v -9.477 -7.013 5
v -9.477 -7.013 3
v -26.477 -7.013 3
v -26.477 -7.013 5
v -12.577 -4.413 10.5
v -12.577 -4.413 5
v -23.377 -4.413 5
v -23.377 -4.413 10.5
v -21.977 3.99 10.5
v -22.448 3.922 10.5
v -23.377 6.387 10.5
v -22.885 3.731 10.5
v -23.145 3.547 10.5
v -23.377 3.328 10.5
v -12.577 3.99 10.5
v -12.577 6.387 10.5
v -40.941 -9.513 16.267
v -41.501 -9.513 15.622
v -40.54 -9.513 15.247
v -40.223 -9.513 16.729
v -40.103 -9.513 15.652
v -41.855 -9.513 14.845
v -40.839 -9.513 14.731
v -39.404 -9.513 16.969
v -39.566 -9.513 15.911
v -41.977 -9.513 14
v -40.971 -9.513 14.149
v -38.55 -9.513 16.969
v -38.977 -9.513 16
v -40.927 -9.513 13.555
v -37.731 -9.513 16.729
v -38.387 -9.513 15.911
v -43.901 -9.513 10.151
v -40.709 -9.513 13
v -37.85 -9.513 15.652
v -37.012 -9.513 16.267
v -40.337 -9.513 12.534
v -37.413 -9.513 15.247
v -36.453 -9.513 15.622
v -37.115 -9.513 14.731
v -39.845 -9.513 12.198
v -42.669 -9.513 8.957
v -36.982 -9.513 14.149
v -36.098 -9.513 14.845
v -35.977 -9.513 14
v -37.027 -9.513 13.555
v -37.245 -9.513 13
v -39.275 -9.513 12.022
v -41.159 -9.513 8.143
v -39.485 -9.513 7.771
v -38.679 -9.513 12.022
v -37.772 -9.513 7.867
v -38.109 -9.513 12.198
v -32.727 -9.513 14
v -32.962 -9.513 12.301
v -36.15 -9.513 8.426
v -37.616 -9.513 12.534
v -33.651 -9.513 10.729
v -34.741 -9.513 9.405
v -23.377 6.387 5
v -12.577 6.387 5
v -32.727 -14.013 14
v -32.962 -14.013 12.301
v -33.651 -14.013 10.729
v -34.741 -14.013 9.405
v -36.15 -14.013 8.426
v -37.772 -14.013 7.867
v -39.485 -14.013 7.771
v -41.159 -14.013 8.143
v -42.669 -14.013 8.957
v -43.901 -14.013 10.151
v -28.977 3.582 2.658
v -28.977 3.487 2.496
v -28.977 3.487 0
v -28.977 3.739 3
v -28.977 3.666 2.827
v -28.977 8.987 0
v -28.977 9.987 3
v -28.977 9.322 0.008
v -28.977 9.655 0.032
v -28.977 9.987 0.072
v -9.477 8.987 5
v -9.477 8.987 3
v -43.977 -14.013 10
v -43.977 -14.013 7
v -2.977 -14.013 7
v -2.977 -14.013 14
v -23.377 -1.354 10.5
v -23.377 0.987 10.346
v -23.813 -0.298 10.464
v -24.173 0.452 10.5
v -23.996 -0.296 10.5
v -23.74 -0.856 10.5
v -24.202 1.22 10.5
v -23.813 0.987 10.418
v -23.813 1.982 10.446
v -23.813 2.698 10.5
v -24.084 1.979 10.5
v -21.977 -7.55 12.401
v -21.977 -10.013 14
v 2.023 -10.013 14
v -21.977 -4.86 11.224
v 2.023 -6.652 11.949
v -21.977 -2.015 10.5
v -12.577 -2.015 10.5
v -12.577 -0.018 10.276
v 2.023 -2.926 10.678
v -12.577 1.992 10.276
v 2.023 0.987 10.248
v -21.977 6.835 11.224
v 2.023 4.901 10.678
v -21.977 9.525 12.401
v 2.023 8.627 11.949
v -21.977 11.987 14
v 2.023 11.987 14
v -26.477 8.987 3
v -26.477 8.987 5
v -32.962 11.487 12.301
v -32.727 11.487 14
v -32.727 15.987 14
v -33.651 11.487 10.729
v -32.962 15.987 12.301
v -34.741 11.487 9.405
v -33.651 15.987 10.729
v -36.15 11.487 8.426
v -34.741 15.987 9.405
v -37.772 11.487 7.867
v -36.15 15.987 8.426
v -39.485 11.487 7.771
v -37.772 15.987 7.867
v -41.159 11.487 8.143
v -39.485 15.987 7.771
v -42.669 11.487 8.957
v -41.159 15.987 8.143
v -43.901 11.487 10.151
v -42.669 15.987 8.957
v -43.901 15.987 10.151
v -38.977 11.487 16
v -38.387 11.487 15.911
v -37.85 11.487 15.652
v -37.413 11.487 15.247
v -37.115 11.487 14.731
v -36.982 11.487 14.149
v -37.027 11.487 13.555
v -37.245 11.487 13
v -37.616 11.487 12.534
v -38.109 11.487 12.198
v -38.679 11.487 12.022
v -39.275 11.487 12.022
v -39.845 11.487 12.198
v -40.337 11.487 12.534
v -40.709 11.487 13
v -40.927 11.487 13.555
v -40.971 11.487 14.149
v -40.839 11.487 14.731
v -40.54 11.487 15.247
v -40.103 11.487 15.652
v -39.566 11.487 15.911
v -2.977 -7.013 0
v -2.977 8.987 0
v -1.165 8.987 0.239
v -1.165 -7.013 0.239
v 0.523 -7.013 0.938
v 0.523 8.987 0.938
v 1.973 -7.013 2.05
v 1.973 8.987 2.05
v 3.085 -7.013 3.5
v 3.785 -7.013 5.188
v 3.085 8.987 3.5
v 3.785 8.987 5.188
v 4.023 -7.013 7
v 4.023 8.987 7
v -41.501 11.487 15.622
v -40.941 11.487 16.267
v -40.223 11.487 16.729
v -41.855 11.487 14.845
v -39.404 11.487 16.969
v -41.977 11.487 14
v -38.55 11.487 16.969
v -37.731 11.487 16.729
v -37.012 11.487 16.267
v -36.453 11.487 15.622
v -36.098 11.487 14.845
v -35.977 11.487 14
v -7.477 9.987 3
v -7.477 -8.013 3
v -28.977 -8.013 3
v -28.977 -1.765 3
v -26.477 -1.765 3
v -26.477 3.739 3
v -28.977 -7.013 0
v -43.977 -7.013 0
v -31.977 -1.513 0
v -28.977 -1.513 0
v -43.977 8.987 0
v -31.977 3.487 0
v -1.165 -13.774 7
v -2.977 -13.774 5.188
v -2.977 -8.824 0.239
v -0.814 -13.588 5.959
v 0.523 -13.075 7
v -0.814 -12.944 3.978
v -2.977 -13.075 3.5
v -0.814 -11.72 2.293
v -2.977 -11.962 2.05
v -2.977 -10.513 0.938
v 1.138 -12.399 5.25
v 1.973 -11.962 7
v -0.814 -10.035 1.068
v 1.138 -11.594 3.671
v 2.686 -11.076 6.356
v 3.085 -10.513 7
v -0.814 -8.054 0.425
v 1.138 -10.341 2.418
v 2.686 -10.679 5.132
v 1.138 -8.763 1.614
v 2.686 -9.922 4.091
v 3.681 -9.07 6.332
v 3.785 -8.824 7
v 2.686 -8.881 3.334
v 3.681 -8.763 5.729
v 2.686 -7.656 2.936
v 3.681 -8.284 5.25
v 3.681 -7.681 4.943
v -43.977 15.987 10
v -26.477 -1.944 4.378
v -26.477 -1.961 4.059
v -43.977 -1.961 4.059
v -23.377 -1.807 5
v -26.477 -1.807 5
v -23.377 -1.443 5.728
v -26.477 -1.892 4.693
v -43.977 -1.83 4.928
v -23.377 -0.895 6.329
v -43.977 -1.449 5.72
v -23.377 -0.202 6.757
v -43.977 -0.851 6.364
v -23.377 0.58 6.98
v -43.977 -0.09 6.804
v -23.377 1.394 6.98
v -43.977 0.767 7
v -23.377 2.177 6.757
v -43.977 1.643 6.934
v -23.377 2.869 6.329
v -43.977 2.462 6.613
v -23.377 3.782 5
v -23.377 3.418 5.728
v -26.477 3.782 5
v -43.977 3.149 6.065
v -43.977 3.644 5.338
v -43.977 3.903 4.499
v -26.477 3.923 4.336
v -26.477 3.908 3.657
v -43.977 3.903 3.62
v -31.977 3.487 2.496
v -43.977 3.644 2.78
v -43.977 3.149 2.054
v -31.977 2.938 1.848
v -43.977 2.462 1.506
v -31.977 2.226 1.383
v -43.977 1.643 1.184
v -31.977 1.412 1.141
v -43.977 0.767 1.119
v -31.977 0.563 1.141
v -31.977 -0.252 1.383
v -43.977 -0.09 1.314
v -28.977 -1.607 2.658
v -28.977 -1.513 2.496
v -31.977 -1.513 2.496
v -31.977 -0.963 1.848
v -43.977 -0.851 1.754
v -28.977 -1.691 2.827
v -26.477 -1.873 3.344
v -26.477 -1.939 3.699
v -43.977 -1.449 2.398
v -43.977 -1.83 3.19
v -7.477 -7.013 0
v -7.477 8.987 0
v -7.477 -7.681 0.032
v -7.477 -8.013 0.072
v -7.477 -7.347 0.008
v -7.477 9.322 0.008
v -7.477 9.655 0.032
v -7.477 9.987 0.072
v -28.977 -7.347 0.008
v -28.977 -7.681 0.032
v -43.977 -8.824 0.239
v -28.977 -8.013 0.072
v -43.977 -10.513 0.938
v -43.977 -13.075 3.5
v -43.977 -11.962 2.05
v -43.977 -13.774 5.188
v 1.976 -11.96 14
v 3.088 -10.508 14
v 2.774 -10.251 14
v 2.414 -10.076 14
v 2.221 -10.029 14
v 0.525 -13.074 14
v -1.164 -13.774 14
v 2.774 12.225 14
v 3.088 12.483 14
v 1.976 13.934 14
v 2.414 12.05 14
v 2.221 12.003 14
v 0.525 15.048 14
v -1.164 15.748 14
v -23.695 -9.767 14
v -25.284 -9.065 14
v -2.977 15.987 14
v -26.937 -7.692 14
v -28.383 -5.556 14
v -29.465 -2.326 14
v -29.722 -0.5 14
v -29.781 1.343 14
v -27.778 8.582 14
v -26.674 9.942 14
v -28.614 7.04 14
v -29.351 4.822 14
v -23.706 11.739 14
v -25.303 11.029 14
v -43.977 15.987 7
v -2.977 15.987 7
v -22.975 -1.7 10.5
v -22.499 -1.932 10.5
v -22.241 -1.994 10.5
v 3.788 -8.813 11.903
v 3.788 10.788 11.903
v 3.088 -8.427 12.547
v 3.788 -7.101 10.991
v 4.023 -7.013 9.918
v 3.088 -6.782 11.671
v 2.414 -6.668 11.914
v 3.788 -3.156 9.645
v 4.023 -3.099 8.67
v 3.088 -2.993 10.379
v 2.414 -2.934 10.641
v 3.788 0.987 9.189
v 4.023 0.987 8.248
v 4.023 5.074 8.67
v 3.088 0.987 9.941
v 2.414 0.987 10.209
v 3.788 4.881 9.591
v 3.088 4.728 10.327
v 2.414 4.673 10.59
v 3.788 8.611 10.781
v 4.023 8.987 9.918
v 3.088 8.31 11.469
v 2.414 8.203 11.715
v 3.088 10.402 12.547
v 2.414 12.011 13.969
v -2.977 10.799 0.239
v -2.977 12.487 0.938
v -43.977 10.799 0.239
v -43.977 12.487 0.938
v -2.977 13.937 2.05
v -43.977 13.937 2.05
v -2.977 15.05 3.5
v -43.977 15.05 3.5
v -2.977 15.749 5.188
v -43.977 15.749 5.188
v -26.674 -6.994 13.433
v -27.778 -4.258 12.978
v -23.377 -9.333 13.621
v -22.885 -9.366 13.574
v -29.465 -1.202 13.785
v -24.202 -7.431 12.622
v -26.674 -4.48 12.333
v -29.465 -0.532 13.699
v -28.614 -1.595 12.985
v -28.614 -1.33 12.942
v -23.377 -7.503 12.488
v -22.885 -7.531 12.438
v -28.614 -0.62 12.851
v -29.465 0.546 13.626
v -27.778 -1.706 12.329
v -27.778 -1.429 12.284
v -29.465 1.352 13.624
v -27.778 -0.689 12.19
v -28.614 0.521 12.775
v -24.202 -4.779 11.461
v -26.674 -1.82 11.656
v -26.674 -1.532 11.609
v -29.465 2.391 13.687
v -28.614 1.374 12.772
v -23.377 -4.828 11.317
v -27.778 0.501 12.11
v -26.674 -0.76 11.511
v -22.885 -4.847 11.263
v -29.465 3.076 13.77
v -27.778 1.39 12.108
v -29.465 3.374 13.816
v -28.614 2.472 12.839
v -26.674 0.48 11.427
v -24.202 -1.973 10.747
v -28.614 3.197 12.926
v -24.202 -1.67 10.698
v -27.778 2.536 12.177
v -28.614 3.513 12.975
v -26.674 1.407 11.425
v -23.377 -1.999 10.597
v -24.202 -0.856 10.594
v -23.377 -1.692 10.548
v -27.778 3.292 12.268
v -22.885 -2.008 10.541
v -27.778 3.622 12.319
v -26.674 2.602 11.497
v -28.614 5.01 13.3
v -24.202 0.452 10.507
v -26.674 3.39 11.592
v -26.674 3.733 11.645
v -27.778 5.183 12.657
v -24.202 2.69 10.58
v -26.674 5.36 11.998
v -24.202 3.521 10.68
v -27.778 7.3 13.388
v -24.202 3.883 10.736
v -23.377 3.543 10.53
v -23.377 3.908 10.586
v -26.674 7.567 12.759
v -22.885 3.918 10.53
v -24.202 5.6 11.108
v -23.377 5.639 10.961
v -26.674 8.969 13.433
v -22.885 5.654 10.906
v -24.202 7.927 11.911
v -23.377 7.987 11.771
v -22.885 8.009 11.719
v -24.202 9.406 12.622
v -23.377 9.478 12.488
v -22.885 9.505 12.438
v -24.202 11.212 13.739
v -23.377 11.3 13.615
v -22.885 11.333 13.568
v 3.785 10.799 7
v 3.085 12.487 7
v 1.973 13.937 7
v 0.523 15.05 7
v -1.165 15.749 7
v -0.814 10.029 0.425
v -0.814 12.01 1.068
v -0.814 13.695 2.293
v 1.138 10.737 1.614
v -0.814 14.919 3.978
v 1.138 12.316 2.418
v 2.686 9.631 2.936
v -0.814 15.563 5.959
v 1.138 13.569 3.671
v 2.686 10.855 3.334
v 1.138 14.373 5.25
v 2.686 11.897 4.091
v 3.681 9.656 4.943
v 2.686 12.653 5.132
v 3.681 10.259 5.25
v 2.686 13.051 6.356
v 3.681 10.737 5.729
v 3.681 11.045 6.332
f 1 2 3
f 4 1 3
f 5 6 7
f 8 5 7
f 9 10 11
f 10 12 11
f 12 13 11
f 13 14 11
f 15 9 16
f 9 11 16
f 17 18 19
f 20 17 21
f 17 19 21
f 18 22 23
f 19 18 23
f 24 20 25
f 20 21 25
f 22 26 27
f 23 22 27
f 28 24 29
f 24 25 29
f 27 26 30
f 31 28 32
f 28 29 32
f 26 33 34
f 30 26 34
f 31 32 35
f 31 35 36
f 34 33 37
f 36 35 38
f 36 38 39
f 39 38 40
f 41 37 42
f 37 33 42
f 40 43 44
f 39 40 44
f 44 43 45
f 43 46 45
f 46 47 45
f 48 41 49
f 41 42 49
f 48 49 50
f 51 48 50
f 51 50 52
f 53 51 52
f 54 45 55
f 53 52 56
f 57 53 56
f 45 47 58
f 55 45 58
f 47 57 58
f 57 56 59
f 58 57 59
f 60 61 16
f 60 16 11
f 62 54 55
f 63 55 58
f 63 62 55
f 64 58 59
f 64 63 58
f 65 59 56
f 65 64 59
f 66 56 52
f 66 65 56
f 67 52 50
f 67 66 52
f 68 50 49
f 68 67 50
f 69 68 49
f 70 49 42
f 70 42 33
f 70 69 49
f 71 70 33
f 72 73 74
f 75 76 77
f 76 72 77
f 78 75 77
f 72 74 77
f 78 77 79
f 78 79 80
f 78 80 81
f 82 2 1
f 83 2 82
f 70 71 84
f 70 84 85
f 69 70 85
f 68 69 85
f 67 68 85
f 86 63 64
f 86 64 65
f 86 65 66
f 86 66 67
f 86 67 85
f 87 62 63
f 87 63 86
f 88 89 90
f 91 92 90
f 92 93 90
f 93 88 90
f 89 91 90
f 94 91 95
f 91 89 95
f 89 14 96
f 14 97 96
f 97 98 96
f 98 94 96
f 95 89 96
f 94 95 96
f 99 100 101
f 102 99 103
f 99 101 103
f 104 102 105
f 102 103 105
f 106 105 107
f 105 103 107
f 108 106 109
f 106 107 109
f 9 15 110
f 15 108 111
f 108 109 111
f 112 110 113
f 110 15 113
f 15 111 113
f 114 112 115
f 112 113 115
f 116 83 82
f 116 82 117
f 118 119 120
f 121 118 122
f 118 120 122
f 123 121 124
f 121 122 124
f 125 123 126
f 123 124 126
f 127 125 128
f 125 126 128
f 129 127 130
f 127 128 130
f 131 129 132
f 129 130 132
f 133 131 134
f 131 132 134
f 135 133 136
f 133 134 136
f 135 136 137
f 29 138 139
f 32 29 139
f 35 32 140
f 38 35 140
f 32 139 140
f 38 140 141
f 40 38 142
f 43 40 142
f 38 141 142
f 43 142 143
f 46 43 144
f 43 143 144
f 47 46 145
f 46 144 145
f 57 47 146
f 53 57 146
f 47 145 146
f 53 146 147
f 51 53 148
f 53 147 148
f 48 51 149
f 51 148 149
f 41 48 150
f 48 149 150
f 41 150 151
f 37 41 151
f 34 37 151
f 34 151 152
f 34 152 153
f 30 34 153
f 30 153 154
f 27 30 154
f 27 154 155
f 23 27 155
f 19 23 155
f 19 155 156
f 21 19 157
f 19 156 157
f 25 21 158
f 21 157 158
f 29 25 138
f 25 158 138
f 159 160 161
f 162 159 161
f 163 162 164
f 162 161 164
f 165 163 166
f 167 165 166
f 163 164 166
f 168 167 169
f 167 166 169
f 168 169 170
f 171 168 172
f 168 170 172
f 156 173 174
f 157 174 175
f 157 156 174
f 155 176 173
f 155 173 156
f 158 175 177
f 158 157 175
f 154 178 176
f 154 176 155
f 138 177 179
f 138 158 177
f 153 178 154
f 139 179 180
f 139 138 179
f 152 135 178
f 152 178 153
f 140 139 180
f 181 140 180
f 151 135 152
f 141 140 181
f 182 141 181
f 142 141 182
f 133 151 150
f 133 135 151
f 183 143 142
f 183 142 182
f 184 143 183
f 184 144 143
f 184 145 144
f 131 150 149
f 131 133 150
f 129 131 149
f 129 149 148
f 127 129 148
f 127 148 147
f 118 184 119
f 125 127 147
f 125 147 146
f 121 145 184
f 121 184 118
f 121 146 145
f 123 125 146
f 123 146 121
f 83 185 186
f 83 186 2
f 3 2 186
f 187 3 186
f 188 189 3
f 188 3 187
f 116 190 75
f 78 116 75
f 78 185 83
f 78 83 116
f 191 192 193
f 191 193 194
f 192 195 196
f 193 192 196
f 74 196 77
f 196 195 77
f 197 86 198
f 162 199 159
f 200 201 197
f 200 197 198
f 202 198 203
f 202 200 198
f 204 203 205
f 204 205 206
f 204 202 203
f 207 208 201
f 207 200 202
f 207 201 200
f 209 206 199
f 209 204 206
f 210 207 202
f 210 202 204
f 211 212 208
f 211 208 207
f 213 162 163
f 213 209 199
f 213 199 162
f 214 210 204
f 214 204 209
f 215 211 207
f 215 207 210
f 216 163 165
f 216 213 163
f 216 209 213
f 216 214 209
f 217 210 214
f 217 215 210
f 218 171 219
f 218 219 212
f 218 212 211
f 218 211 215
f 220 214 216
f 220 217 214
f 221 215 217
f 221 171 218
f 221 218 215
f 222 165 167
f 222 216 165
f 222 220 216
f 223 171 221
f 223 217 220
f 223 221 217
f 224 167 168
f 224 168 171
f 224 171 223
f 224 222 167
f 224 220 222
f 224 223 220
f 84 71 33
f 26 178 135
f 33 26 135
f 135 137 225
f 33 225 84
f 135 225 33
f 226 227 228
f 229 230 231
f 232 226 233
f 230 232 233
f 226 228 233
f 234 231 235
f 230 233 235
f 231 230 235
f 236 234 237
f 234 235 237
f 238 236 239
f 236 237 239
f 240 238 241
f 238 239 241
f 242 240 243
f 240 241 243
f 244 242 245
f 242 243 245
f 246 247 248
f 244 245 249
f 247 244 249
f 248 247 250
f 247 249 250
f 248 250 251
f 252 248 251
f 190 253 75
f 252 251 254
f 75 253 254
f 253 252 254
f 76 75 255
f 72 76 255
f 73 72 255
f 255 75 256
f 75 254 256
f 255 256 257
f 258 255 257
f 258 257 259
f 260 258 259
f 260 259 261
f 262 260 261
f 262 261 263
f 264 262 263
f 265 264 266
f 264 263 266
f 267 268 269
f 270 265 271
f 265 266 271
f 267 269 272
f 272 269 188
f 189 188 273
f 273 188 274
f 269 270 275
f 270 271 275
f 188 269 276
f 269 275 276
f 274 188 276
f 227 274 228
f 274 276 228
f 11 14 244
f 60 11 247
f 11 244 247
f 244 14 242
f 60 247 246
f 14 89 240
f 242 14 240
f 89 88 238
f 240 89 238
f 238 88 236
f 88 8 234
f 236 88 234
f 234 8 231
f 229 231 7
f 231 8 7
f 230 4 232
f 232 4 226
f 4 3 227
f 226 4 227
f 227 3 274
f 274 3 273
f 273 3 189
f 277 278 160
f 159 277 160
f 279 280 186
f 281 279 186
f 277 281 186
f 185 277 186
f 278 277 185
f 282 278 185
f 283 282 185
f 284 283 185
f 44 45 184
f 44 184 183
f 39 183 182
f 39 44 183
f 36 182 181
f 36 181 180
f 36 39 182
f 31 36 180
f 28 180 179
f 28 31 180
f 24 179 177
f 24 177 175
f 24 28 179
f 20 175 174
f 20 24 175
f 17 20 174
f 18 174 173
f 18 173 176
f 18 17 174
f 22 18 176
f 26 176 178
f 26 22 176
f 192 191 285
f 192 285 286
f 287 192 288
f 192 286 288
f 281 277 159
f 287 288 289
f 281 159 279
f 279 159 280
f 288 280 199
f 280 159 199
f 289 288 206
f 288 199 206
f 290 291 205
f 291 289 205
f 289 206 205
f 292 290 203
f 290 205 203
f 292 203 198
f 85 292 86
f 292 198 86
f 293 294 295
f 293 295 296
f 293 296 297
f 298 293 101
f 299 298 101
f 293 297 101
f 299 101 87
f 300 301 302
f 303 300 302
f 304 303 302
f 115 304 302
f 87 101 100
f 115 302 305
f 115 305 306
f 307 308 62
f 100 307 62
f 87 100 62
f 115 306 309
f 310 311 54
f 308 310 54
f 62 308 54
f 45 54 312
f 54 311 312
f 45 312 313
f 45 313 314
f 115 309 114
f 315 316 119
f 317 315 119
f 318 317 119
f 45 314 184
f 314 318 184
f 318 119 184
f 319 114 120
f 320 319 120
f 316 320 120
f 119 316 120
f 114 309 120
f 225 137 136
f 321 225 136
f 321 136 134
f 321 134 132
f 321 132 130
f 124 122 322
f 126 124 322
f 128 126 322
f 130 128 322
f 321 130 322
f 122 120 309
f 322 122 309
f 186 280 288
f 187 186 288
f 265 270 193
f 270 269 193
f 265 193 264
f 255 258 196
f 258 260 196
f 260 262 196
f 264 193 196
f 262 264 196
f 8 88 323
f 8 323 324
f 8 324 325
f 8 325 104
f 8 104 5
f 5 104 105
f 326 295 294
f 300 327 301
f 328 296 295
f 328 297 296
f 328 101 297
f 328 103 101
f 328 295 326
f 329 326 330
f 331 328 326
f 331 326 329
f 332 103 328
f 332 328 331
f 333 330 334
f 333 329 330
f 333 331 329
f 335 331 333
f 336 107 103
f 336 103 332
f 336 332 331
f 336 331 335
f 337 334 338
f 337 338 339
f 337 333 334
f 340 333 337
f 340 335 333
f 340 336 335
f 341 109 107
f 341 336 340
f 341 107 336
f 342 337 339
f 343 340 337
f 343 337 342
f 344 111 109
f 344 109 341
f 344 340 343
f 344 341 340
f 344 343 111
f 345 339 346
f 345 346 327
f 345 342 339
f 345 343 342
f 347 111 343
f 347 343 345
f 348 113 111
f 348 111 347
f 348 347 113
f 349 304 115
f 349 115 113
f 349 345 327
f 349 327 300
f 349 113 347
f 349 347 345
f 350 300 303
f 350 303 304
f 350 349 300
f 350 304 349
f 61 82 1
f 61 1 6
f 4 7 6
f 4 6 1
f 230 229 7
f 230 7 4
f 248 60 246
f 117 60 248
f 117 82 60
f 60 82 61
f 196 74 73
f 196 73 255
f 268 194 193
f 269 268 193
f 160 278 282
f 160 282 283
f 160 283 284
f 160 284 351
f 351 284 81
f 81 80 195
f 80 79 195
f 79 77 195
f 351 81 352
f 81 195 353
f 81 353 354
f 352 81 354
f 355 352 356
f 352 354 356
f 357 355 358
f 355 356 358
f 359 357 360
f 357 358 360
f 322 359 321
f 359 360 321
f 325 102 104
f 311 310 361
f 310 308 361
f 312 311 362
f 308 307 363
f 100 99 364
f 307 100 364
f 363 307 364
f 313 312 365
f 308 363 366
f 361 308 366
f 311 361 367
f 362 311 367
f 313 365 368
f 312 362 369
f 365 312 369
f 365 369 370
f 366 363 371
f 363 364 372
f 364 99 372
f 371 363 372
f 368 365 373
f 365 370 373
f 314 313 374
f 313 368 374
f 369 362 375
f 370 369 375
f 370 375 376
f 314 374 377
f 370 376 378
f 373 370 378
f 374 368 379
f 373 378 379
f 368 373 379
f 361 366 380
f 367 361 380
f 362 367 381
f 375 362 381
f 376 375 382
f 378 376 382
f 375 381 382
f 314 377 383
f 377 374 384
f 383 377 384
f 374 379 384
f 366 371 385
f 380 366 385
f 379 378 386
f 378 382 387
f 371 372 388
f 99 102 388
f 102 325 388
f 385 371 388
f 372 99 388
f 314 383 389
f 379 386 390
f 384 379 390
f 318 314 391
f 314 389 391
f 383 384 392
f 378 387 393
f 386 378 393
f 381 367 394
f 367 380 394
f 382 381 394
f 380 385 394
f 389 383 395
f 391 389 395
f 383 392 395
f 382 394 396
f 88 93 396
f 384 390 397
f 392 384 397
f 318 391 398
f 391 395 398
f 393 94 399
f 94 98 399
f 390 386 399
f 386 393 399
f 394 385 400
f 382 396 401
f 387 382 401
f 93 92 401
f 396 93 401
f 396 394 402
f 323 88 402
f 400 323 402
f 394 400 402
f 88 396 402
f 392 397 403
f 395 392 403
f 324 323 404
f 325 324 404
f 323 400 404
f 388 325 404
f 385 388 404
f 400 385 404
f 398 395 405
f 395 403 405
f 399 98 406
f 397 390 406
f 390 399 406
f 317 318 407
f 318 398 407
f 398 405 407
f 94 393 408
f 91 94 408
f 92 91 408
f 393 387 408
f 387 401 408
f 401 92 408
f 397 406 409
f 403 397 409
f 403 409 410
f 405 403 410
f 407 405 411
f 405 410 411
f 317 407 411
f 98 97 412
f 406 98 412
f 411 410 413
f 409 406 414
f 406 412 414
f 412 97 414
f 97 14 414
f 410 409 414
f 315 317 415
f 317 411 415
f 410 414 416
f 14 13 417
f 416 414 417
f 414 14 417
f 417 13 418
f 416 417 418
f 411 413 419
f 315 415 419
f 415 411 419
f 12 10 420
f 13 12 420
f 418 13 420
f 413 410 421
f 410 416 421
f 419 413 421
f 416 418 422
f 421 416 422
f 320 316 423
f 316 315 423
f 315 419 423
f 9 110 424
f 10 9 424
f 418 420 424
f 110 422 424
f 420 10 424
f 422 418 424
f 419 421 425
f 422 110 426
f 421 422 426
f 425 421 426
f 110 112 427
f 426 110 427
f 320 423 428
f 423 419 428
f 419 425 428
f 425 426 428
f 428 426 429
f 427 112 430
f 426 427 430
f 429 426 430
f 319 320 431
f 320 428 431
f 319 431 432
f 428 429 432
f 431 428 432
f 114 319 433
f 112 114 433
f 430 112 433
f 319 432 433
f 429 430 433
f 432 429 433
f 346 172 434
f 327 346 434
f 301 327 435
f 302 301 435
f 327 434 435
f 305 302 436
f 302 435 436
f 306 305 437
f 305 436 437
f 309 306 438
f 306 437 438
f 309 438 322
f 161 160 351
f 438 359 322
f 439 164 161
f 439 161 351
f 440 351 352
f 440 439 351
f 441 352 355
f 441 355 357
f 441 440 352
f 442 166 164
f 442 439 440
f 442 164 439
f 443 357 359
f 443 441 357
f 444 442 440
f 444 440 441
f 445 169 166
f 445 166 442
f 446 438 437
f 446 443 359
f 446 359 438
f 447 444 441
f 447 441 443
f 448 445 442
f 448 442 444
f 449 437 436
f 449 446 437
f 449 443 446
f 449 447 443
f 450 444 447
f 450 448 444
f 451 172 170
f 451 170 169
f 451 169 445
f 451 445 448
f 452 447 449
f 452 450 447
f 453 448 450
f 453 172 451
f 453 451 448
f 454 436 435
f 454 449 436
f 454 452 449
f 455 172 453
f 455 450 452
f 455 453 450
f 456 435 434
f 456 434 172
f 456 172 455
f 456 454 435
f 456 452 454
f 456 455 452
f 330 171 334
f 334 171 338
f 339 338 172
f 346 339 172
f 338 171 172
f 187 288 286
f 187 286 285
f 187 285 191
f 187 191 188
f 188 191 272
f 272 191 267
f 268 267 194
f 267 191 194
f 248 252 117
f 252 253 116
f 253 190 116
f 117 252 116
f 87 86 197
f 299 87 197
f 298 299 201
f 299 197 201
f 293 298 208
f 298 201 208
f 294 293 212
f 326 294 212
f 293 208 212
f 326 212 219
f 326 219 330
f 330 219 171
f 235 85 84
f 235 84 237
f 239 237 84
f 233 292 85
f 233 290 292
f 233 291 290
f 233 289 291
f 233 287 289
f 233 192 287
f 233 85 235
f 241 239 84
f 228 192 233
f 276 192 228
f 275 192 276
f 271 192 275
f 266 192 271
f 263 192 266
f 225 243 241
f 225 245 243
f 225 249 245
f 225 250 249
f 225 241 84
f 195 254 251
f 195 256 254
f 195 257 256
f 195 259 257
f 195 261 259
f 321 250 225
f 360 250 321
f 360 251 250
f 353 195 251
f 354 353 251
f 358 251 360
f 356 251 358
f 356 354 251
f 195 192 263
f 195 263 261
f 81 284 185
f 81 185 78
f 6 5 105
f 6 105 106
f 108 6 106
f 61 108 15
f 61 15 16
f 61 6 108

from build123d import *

# Parameters (mm, degrees)
CROQUIS1_W                 = 48
CROQUIS1_H                 = 30
SALIENTE_EXTRUIR1_DEPTH    = 14
CORTAR_EXTRUIR1_DEPTH      = 36
REDONDEO1_R                = 2
REDONDEO2_R                = 7
CROQUIS3_W                 = 21.5
CROQUIS3_H                 = 18
CORTAR_EXTRUIR2_DEPTH      = 3
CORTAR_EXTRUIR3_REACH      = 50.842
CORTAR_EXTRUIR3_END_RADIUS = 18
CROQUIS5_R                 = 1
CROQUIS6_W                 = 10.8
CROQUIS6_H                 = 10.8
CORTAR_EXTRUIR4_DEPTH      = 7.5
CROQUIS7_W                 = 17
CROQUIS7_H                 = 16
CORTAR_EXTRUIR5_DEPTH      = 2
CROQUIS9_R                 = 3
SALIENTE_EXTRUIR2_DEPTH    = 30
CROQUIS10_R                = 6.25
CORTAR_EXTRUIR7_DEPTH      = 4.5
CROQUIS11_R                = 2
CORTAR_EXTRUIR8_DEPTH      = 21
CORTAR_EXTRUIR9_REACH      = 57.883
CROQUIS13_W                = 3
CROQUIS13_H                = 5
CORTAR_EXTRUIR10_DEPTH     = 3
REDONDEO3_R                = 10
CROQUIS14_R                = 2.948637221
CORTAR_EXTRUIR15_DEPTH     = 21


with BuildPart() as part:
    # Croquis1 → Saliente-Extruir1 (new body)
    with BuildSketch(Plane.XY):
        with Locations((-19.976765257, 0.987352556)):
            Rectangle(CROQUIS1_W, CROQUIS1_H)
    extrude(amount=SALIENTE_EXTRUIR1_DEPTH)

    # Croquis2 → Cortar-Extruir1 (cut)
    with BuildSketch(Plane(origin=(4.023234743, 0, 0), x_dir=(0, 0, -1), z_dir=(1, 0, 0))):
        with BuildLine():
            ThreePointArc((-14, -10.012647444), (-10.247806849, 0.987352556), (-14, 11.987352556))
            Line((-14, 11.987352556), (-14, -10.012647444))
        make_face()
    extrude(amount=-CORTAR_EXTRUIR1_DEPTH, mode=Mode.SUBTRACT)

    # Redondeo1
    redondeo1_edges = [part.edges().sort_by_distance(p)[0] for p in [
        (4.023234743, 0.987352556, 10.247806849),
    ]]
    fillet(redondeo1_edges, radius=REDONDEO1_R)

    # Redondeo2
    # the kernel refuses this fillet: 7 mm, written as the material it takes off along each edge
    with BuildSketch(Plane(origin=(-2.976765257, -7.012647444, 7), x_dir=(0, -1, 0), z_dir=(1, 0, 0))) as redondeo2_piece_1_section:
        Polygon((0, 0), (REDONDEO2_R * 1.02, 0), (REDONDEO2_R * 1.02, REDONDEO2_R * 1.02), (0, REDONDEO2_R * 1.02), align=None)
    redondeo2_piece_1 = extrude(amount=REDONDEO2_R * 1.02, mode=Mode.PRIVATE)
    redondeo2_piece_1 = redondeo2_piece_1 - Plane(origin=(-2.976765257, -7.012647444, 7), x_dir=(0, 0.7071067811865475, 0.7071067811865475), z_dir=(1, 0, 0)) * Sphere(REDONDEO2_R, mode=Mode.PRIVATE)
    add(redondeo2_piece_1, mode=Mode.SUBTRACT)
    with BuildSketch(Plane(origin=(-2.976765257, 8.987352556, 7), x_dir=(0, 0, -1), z_dir=(1, 0, 0))) as redondeo2_piece_2_section:
        Polygon((0, 0), (REDONDEO2_R * 1.02, 0), (REDONDEO2_R * 1.02, REDONDEO2_R * 1.02), (0, REDONDEO2_R * 1.02), align=None)
    redondeo2_piece_2 = extrude(amount=REDONDEO2_R * 1.02, mode=Mode.PRIVATE)
    redondeo2_piece_2 = redondeo2_piece_2 - Plane(origin=(-2.976765257, 8.987352556, 7), x_dir=(0, -0.7071067811865475, 0.7071067811865475), z_dir=(1, 0, 0)) * Sphere(REDONDEO2_R, mode=Mode.PRIVATE)
    add(redondeo2_piece_2, mode=Mode.SUBTRACT)
    with BuildSketch(Plane(origin=(-2.976765257, -14.012647444, 0), x_dir=(0, 0, 1), z_dir=(-1, 0, 0))) as redondeo2_piece_3:
        with BuildLine():
            CenterArc((REDONDEO2_R, REDONDEO2_R), REDONDEO2_R, 180, 90)
            Line((0, REDONDEO2_R), (-REDONDEO2_R * 0.02, REDONDEO2_R))
            Line((-REDONDEO2_R * 0.02, REDONDEO2_R), (-REDONDEO2_R * 0.02, -REDONDEO2_R * 0.02))
            Line((-REDONDEO2_R * 0.02, -REDONDEO2_R * 0.02), (REDONDEO2_R, -REDONDEO2_R * 0.02))
            Line((REDONDEO2_R, -REDONDEO2_R * 0.02), (REDONDEO2_R, 0))
        make_face()
    extrude(amount=58.5, mode=Mode.SUBTRACT)
    with BuildSketch(Plane(origin=(4.023234743, 8.987352556, 0), x_dir=(0, 0, 1), z_dir=(0, -1, 0))) as redondeo2_piece_4:
        with BuildLine():
            CenterArc((REDONDEO2_R, REDONDEO2_R), REDONDEO2_R, 180, 90)
            Line((0, REDONDEO2_R), (-REDONDEO2_R * 0.02, REDONDEO2_R))
            Line((-REDONDEO2_R * 0.02, REDONDEO2_R), (-REDONDEO2_R * 0.02, -REDONDEO2_R * 0.02))
            Line((-REDONDEO2_R * 0.02, -REDONDEO2_R * 0.02), (REDONDEO2_R, -REDONDEO2_R * 0.02))
            Line((REDONDEO2_R, -REDONDEO2_R * 0.02), (REDONDEO2_R, 0))
        make_face()
    extrude(amount=16, mode=Mode.SUBTRACT)
    with BuildSketch(Plane(origin=(-61.476765257, 15.987352556, 0), x_dir=(0, -1, 0), z_dir=(1, 0, 0))) as redondeo2_piece_5:
        with BuildLine():
            CenterArc((REDONDEO2_R, -REDONDEO2_R), REDONDEO2_R, 90, 90)
            Line((0, -REDONDEO2_R), (-REDONDEO2_R * 0.02, -REDONDEO2_R))
            Line((-REDONDEO2_R * 0.02, -REDONDEO2_R), (-REDONDEO2_R * 0.02, REDONDEO2_R * 0.02))
            Line((-REDONDEO2_R * 0.02, REDONDEO2_R * 0.02), (REDONDEO2_R, REDONDEO2_R * 0.02))
            Line((REDONDEO2_R, REDONDEO2_R * 0.02), (REDONDEO2_R, 0))
        make_face()
    extrude(amount=58.5, mode=Mode.SUBTRACT)
    with BuildSketch(Plane(origin=(4.023234743, 15.987352556, 7), x_dir=(0, -1, 0), z_dir=(0, 0, 1))) as redondeo2_piece_6:
        with BuildLine():
            CenterArc((REDONDEO2_R, -REDONDEO2_R), REDONDEO2_R, 90, 90)
            Line((0, -REDONDEO2_R), (-REDONDEO2_R * 0.02, -REDONDEO2_R))
            Line((-REDONDEO2_R * 0.02, -REDONDEO2_R), (-REDONDEO2_R * 0.02, REDONDEO2_R * 0.02))
            Line((-REDONDEO2_R * 0.02, REDONDEO2_R * 0.02), (REDONDEO2_R, REDONDEO2_R * 0.02))
            Line((REDONDEO2_R, REDONDEO2_R * 0.02), (REDONDEO2_R, 0))
        make_face()
    extrude(amount=24.5, mode=Mode.SUBTRACT)
    with BuildSketch(Plane(origin=(4.023234743, -14.012647444, 7), x_dir=(0, 1, 0), z_dir=(0, 0, 1))) as redondeo2_piece_7:
        with BuildLine():
            CenterArc((REDONDEO2_R, REDONDEO2_R), REDONDEO2_R, 180, 90)
            Line((0, REDONDEO2_R), (-REDONDEO2_R * 0.02, REDONDEO2_R))
            Line((-REDONDEO2_R * 0.02, REDONDEO2_R), (-REDONDEO2_R * 0.02, -REDONDEO2_R * 0.02))
            Line((-REDONDEO2_R * 0.02, -REDONDEO2_R * 0.02), (REDONDEO2_R, -REDONDEO2_R * 0.02))
            Line((REDONDEO2_R, -REDONDEO2_R * 0.02), (REDONDEO2_R, 0))
        make_face()
    extrude(amount=24.5, mode=Mode.SUBTRACT)

    # Croquis3 → Cortar-Extruir2 (cut)
    with BuildSketch(Plane(origin=(0, 0, 0), x_dir=(-1, 0, 0), z_dir=(0, 0, -1))):
        with Locations((18.226765257, 0.987352556)):
            Rectangle(CROQUIS3_W, CROQUIS3_H)
    extrude(amount=-CORTAR_EXTRUIR2_DEPTH, mode=Mode.SUBTRACT)

    # Cortar-Extruir3: up to this cylinder (the profile starts outside it)
    cortar_extruir3_end = Plane(origin=(-17.976765, 0.987352556, 28.247806849), z_dir=(1, 0, 0)) * Cylinder(CORTAR_EXTRUIR3_END_RADIUS, 138.684, mode=Mode.PRIVATE)
    # Croquis5 → Cortar-Extruir3 (cut, up to the surface)
    with BuildSketch(Plane(origin=(0, 0, 0), x_dir=(-1, 0, 0), z_dir=(0, 0, -1)), mode=Mode.PRIVATE) as cortar_extruir3_sk1:
        with Locations((17.976765257, 0.987352556)):
            Circle(CROQUIS5_R)
    cortar_extruir3_tool1 = extrude(cortar_extruir3_sk1.sketch, amount=-CORTAR_EXTRUIR3_REACH, mode=Mode.PRIVATE) - cortar_extruir3_end
    add(cortar_extruir3_tool1.solids().sort_by_distance((-17.976765, 0.987353, 0))[0], mode=Mode.SUBTRACT)

    # Croquis6 → Cortar-Extruir4 (cut)
    with BuildSketch(Plane(origin=(0, 0, 3), x_dir=(-1, 0, 0), z_dir=(0, 0, -1))):
        with Locations((17.976765257, 0.987352556)):
            Rectangle(CROQUIS6_W, CROQUIS6_H)
    extrude(amount=-CORTAR_EXTRUIR4_DEPTH, mode=Mode.SUBTRACT)

    # Croquis7 → Cortar-Extruir5 (cut)
    with BuildSketch(Plane(origin=(0, 0, 3), x_dir=(-1, 0, 0), z_dir=(0, 0, -1))):
        with Locations((17.976765257, 0.987352556)):
            Rectangle(CROQUIS7_W, CROQUIS7_H)
    extrude(amount=-CORTAR_EXTRUIR5_DEPTH, mode=Mode.SUBTRACT)

    # Croquis9 → Saliente-Extruir2 (add)
    with BuildSketch(Plane.XZ.offset(14.012647444)):
        with Locations((-38.976765257, 14)):
            Circle(CROQUIS9_R)
    extrude(amount=-SALIENTE_EXTRUIR2_DEPTH)

    # Croquis10 → Cortar-Extruir7 (cut)
    with BuildSketch(Plane(origin=(0, 15.987352556, 0), x_dir=(1, 0, 0), z_dir=(0, 1, 0))):
        with Locations((-38.976765257, -14)):
            Circle(CROQUIS10_R)
    cortar_extruir7 = extrude(amount=-CORTAR_EXTRUIR7_DEPTH, mode=Mode.SUBTRACT)

    # Simetría1: Cortar-Extruir7 across plane
    add(cortar_extruir7.mirror(Plane.ZX.offset(0.987352556)), mode=Mode.SUBTRACT)

    # Croquis11 → Cortar-Extruir8 (cut)
    with BuildSketch(Plane(origin=(0, 11.487352556, 0), x_dir=(-1, 0, 0), z_dir=(0, 1, 0))):
        with Locations(Location((38.976765257, 14, 0), (0, 0, 90))):
            Circle(CROQUIS11_R)
    extrude(amount=-CORTAR_EXTRUIR8_DEPTH, mode=Mode.SUBTRACT)

    # Cortar-Extruir9: up to this face of the body (flat: up to its plane)
    cortar_extruir9_end = Plane(part.part.faces().sort_by_distance((-19.613737998, -14.012647444, 10.301702011))[0])
    # Croquis12 → Cortar-Extruir9 (cut, up to the picked face)
    with BuildSketch(Plane(origin=(0, 15.987352556, 0), x_dir=(1, 0, 0), z_dir=(0, 1, 0)), mode=Mode.PRIVATE) as cortar_extruir9_sk1:
        Polygon((-43.976765257, -10), (-43.976765257, -14), (-41.976765257, -14), align=None)
    cortar_extruir9_tool1 = split(extrude(cortar_extruir9_sk1.sketch, amount=-CORTAR_EXTRUIR9_REACH, mode=Mode.PRIVATE), bisect_by=cortar_extruir9_end, keep=Keep.BOTH, mode=Mode.PRIVATE)
    add(cortar_extruir9_tool1.solids().sort_by(Axis((-43.310099, 15.987353, 12.666667), (0, -1, 0)))[0], mode=Mode.SUBTRACT)

    # Croquis13 → Cortar-Extruir10 (cut)
    with BuildSketch(Plane(origin=(0, 0, 0), x_dir=(-1, 0, 0), z_dir=(0, 0, -1))):
        with Locations((30.476765257, 0.987352556)):
            Rectangle(CROQUIS13_W, CROQUIS13_H)
    extrude(amount=-CORTAR_EXTRUIR10_DEPTH, mode=Mode.SUBTRACT)

    # Redondeo3
    # the kernel refuses this fillet: 10 mm, written as the material it adds along each edge
    with BuildSketch(Plane(origin=(-31.976765257, 0.987352556, 28.247806849), x_dir=(0, -0.8888591986408035, 0.45818045025036674), z_dir=(0, 0.45818045025036674, 0.8888591986408035))) as redondeo3_piece_1_section:
        with BuildLine():
            CenterArc((18 - REDONDEO3_R, REDONDEO3_R), REDONDEO3_R, 270, 90)
            Line((18 - REDONDEO3_R, 0), (18, 0))
            Line((18, 0), (18, REDONDEO3_R))
        make_face()
    redondeo3_piece_1 = revolve(axis=Axis((-31.976765257, 0.987352556, 28.247806849), (1, 0, 0)), revolution_arc=234.53951494, mode=Mode.PRIVATE)
    redondeo3_piece_1 = split(redondeo3_piece_1, bisect_by=Plane(origin=(-22.679016641, -5.92095726, 14), z_dir=(0, 0, -1)), keep=Keep.TOP, mode=Mode.PRIVATE)
    redondeo3_piece_1 = split(redondeo3_piece_1, bisect_by=Plane(origin=(-22.679016641, -5.92095726, 10.5), z_dir=(0, 0, 1)), keep=Keep.TOP, mode=Mode.PRIVATE)
    add(redondeo3_piece_1)
    with BuildSketch(Plane(origin=(-31.976765257, 0.987352556, 28.247806849), x_dir=(0, -0.8888591986408035, 0.45818045025036674), z_dir=(0, 0.45818045025036674, 0.8888591986408035))) as redondeo3_piece_2_section:
        with BuildLine():
            CenterArc((18 - REDONDEO3_R, REDONDEO3_R), REDONDEO3_R, 270, 90)
            Line((18 - REDONDEO3_R, 0), (18, 0))
            Line((18, 0), (18, REDONDEO3_R))
        make_face()
    redondeo3_piece_2 = revolve(axis=Axis((-31.976765257, 0.987352556, 28.247806849), (1, 0, 0)), revolution_arc=234.53951494, mode=Mode.PRIVATE)
    redondeo3_piece_2 = split(redondeo3_piece_2, bisect_by=Plane(origin=(-27.760529224, 0.987352545, 10.5), z_dir=(0, 0, -1)), keep=Keep.TOP, mode=Mode.PRIVATE)
    redondeo3_piece_2 = split(redondeo3_piece_2, bisect_by=Plane(origin=(-23.376765257, 0.987352545, 10.397912487), z_dir=(-1, 0, 0)), keep=Keep.TOP, mode=Mode.PRIVATE)
    add(redondeo3_piece_2)

    # Croquis14 → Cortar-Extruir15 (cut)
    with BuildSketch(Plane.ZY.offset(43.976765257)):
        with Locations(Location((4.059124212, 0.987352556, 0), (0, 0, 270))):
            Circle(CROQUIS14_R)
    extrude(amount=-CORTAR_EXTRUIR15_DEPTH, mode=Mode.SUBTRACT)


solid = part.part
